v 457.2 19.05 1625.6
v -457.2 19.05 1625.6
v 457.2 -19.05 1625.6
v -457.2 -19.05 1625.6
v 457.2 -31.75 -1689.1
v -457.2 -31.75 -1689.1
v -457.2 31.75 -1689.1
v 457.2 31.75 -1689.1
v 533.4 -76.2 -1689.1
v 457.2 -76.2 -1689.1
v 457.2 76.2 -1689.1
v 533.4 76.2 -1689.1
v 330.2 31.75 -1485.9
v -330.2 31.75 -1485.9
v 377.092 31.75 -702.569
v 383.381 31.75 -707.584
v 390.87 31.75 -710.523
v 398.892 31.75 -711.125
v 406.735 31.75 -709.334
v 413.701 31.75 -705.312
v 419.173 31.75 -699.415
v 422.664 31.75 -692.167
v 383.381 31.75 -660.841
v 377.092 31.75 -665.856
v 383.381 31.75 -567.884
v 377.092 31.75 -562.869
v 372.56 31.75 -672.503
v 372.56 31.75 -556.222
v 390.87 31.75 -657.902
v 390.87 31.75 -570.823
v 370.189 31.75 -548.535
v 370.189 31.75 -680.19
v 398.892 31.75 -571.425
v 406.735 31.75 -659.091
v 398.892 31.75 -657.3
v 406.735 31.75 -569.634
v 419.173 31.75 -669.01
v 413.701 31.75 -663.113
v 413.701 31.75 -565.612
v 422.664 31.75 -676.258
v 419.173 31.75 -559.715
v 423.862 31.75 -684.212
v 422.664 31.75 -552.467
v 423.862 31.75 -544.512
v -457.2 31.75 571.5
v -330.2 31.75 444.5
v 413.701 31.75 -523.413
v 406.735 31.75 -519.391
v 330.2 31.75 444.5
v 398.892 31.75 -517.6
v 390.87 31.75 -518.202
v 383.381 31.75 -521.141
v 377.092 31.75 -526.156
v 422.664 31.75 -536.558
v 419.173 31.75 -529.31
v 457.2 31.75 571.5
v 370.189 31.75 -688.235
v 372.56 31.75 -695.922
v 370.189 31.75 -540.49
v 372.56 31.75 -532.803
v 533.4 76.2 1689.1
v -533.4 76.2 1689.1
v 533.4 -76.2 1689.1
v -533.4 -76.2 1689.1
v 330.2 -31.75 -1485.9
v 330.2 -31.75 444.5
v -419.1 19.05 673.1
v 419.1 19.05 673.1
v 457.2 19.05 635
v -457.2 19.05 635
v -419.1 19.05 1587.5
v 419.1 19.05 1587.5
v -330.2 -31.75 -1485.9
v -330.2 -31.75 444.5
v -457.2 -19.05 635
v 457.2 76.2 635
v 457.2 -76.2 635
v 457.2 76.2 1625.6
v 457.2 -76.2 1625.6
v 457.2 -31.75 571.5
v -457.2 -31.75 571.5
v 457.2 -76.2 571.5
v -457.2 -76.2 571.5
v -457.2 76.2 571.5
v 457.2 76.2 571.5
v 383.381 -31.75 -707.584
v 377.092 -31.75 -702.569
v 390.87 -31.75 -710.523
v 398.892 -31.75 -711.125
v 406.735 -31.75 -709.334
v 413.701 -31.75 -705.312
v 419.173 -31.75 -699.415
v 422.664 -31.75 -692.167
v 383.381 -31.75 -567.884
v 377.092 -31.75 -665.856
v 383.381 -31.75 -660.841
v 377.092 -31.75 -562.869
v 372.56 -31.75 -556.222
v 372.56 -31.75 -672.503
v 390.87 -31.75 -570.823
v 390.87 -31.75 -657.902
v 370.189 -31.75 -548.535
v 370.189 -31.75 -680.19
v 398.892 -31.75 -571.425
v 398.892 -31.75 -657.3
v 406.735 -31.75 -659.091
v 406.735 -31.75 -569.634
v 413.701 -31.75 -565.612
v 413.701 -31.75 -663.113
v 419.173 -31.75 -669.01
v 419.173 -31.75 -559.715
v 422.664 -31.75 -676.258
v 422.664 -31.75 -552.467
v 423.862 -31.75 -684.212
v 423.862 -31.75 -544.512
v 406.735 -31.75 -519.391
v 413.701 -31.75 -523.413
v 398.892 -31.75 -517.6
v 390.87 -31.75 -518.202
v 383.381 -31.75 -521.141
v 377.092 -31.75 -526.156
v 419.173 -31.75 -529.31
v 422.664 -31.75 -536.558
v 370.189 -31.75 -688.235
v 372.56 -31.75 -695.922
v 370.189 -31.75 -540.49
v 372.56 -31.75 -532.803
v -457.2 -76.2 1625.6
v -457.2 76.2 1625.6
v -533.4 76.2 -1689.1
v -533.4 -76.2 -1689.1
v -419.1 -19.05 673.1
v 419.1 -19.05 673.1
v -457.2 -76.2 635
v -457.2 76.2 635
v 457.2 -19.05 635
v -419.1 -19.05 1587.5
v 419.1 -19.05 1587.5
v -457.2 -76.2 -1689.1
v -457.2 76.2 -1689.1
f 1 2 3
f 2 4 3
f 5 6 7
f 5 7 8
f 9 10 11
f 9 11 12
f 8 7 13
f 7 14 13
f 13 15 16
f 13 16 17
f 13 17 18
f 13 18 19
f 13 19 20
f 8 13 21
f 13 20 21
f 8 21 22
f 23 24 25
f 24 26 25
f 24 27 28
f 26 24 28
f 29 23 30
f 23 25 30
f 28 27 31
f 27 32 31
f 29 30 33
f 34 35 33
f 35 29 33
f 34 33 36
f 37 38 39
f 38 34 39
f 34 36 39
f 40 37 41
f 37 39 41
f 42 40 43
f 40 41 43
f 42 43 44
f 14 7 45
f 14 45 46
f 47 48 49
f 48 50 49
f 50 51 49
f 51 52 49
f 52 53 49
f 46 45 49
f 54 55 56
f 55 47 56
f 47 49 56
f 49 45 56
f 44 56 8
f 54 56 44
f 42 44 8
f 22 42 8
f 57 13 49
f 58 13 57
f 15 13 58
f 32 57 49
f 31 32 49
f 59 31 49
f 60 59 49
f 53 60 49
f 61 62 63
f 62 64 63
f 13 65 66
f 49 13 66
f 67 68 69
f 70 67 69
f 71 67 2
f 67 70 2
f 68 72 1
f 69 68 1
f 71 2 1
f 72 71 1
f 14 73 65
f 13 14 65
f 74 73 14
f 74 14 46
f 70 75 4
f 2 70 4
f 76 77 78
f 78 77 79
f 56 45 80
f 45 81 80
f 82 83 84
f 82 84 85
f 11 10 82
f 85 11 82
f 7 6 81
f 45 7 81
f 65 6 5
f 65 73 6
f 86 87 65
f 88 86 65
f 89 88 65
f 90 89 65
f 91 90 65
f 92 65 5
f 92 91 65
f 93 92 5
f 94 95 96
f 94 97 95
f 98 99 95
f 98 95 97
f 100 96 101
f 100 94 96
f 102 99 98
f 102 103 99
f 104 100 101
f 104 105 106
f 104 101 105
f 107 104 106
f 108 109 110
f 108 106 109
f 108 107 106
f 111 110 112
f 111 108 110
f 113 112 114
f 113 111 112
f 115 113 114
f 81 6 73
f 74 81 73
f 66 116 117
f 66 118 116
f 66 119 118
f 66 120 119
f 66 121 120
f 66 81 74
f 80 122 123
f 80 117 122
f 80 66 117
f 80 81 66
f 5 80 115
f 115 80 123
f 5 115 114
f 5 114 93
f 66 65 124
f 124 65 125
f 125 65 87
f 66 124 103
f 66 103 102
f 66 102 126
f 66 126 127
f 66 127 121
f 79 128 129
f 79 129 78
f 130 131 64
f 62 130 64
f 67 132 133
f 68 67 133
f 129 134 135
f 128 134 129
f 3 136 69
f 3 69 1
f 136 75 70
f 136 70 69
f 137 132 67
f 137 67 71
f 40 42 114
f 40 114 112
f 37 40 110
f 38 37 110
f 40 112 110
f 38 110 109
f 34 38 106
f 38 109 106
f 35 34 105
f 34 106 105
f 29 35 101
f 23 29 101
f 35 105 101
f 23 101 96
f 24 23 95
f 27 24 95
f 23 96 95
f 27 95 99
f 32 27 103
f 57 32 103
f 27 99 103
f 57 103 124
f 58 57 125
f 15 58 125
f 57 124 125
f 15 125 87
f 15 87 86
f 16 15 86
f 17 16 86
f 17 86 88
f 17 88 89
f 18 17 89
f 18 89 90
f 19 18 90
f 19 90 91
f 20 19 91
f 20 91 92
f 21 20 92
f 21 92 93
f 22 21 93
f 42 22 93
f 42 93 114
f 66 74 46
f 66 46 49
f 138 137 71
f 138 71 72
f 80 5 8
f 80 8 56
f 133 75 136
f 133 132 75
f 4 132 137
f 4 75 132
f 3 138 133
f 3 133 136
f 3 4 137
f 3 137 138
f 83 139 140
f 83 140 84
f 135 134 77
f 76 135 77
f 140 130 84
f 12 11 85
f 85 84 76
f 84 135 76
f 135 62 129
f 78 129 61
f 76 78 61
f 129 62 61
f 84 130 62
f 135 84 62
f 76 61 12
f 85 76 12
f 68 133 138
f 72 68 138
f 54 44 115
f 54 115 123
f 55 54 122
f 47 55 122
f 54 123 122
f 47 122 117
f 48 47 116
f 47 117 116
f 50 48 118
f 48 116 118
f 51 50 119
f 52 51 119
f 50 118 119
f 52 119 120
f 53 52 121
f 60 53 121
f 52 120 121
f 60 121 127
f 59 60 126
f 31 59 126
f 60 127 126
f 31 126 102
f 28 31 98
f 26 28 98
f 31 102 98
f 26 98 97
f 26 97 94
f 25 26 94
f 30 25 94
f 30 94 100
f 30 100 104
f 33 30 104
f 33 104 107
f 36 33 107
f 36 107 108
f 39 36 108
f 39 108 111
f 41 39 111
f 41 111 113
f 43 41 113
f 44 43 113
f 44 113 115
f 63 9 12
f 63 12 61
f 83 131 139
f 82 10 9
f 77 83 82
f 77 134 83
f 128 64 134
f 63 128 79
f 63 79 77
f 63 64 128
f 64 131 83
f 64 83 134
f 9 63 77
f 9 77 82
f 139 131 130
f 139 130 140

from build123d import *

# Parameters (mm, degrees)
F0_W      = 1066.8
F0_H      = 3378.2
F1_DEPTH  = 76.2
F2_W      = 914.4
F2_H      = 2260.6
F2_H_2    = 990.6
F3_DEPTH  = 152.401
F4_W      = 914.4
F4_H      = 990.6
F5_DEPTH  = 19.05
F6_W      = 914.4
F6_H      = 2260.6
F7_DEPTH  = 31.75
F8_W      = 660.4
F8_H      = 1930.4
F9_DEPTH  = 107.951
F10_W     = 838.2
F10_H     = 914.4
F11_DEPTH = 95.251
F12_R     = 26.9875
F13_DEPTH = 107.951


with BuildPart() as f1:
    # F0 (on Front) → F1 (new body, symmetric)
    with BuildSketch(Plane.XZ):
        Rectangle(F0_W, F0_H)
    extrude(amount=F1_DEPTH, both=True)

    # F2 (on face) → F3 (cut, through all)
    with BuildSketch(Plane.XZ.offset(76.2)):
        with Locations((0, -558.8)):
            Rectangle(F2_W, F2_H)
        with Locations((0, 1130.3)):
            Rectangle(F2_W, F2_H_2)
    extrude(amount=-F3_DEPTH, mode=Mode.SUBTRACT)


with BuildPart() as f5:
    # F4 (on Front) → F5 (new body, symmetric)
    with BuildSketch(Plane.XZ):
        with Locations((0, 1130.3)):
            Rectangle(F4_W, F4_H)
    extrude(amount=F5_DEPTH, both=True)

    # F10 (on face) → F11 (cut, through all)
    with BuildSketch(Plane.XZ.offset(19.05)):
        with Locations((0, 1130.3)):
            Rectangle(F10_W, F10_H)
    extrude(amount=-F11_DEPTH, mode=Mode.SUBTRACT)


with BuildPart() as f7:
    # F6 (on Front) → F7 (new body, symmetric)
    with BuildSketch(Plane.XZ):
        with Locations((0, -558.8)):
            Rectangle(F6_W, F6_H)
    extrude(amount=F7_DEPTH, both=True)

    # F8 (on face) → F9 (cut, through all)
    with BuildSketch(Plane.XZ.offset(31.75)):
        with Locations((0, -520.7)):
            Rectangle(F8_W, F8_H)
    extrude(amount=-F9_DEPTH, mode=Mode.SUBTRACT)

    # F12 (on face) → F13 (cut, through all)
    with BuildSketch(Plane.XZ.offset(31.75)):
        with Locations((396.875, -684.2125)):
            Circle(F12_R)
        with Locations((396.875, -544.5125)):
            Circle(F12_R)
    extrude(amount=-F13_DEPTH, mode=Mode.SUBTRACT)


solid = Compound([f1.part, f5.part, f7.part])
